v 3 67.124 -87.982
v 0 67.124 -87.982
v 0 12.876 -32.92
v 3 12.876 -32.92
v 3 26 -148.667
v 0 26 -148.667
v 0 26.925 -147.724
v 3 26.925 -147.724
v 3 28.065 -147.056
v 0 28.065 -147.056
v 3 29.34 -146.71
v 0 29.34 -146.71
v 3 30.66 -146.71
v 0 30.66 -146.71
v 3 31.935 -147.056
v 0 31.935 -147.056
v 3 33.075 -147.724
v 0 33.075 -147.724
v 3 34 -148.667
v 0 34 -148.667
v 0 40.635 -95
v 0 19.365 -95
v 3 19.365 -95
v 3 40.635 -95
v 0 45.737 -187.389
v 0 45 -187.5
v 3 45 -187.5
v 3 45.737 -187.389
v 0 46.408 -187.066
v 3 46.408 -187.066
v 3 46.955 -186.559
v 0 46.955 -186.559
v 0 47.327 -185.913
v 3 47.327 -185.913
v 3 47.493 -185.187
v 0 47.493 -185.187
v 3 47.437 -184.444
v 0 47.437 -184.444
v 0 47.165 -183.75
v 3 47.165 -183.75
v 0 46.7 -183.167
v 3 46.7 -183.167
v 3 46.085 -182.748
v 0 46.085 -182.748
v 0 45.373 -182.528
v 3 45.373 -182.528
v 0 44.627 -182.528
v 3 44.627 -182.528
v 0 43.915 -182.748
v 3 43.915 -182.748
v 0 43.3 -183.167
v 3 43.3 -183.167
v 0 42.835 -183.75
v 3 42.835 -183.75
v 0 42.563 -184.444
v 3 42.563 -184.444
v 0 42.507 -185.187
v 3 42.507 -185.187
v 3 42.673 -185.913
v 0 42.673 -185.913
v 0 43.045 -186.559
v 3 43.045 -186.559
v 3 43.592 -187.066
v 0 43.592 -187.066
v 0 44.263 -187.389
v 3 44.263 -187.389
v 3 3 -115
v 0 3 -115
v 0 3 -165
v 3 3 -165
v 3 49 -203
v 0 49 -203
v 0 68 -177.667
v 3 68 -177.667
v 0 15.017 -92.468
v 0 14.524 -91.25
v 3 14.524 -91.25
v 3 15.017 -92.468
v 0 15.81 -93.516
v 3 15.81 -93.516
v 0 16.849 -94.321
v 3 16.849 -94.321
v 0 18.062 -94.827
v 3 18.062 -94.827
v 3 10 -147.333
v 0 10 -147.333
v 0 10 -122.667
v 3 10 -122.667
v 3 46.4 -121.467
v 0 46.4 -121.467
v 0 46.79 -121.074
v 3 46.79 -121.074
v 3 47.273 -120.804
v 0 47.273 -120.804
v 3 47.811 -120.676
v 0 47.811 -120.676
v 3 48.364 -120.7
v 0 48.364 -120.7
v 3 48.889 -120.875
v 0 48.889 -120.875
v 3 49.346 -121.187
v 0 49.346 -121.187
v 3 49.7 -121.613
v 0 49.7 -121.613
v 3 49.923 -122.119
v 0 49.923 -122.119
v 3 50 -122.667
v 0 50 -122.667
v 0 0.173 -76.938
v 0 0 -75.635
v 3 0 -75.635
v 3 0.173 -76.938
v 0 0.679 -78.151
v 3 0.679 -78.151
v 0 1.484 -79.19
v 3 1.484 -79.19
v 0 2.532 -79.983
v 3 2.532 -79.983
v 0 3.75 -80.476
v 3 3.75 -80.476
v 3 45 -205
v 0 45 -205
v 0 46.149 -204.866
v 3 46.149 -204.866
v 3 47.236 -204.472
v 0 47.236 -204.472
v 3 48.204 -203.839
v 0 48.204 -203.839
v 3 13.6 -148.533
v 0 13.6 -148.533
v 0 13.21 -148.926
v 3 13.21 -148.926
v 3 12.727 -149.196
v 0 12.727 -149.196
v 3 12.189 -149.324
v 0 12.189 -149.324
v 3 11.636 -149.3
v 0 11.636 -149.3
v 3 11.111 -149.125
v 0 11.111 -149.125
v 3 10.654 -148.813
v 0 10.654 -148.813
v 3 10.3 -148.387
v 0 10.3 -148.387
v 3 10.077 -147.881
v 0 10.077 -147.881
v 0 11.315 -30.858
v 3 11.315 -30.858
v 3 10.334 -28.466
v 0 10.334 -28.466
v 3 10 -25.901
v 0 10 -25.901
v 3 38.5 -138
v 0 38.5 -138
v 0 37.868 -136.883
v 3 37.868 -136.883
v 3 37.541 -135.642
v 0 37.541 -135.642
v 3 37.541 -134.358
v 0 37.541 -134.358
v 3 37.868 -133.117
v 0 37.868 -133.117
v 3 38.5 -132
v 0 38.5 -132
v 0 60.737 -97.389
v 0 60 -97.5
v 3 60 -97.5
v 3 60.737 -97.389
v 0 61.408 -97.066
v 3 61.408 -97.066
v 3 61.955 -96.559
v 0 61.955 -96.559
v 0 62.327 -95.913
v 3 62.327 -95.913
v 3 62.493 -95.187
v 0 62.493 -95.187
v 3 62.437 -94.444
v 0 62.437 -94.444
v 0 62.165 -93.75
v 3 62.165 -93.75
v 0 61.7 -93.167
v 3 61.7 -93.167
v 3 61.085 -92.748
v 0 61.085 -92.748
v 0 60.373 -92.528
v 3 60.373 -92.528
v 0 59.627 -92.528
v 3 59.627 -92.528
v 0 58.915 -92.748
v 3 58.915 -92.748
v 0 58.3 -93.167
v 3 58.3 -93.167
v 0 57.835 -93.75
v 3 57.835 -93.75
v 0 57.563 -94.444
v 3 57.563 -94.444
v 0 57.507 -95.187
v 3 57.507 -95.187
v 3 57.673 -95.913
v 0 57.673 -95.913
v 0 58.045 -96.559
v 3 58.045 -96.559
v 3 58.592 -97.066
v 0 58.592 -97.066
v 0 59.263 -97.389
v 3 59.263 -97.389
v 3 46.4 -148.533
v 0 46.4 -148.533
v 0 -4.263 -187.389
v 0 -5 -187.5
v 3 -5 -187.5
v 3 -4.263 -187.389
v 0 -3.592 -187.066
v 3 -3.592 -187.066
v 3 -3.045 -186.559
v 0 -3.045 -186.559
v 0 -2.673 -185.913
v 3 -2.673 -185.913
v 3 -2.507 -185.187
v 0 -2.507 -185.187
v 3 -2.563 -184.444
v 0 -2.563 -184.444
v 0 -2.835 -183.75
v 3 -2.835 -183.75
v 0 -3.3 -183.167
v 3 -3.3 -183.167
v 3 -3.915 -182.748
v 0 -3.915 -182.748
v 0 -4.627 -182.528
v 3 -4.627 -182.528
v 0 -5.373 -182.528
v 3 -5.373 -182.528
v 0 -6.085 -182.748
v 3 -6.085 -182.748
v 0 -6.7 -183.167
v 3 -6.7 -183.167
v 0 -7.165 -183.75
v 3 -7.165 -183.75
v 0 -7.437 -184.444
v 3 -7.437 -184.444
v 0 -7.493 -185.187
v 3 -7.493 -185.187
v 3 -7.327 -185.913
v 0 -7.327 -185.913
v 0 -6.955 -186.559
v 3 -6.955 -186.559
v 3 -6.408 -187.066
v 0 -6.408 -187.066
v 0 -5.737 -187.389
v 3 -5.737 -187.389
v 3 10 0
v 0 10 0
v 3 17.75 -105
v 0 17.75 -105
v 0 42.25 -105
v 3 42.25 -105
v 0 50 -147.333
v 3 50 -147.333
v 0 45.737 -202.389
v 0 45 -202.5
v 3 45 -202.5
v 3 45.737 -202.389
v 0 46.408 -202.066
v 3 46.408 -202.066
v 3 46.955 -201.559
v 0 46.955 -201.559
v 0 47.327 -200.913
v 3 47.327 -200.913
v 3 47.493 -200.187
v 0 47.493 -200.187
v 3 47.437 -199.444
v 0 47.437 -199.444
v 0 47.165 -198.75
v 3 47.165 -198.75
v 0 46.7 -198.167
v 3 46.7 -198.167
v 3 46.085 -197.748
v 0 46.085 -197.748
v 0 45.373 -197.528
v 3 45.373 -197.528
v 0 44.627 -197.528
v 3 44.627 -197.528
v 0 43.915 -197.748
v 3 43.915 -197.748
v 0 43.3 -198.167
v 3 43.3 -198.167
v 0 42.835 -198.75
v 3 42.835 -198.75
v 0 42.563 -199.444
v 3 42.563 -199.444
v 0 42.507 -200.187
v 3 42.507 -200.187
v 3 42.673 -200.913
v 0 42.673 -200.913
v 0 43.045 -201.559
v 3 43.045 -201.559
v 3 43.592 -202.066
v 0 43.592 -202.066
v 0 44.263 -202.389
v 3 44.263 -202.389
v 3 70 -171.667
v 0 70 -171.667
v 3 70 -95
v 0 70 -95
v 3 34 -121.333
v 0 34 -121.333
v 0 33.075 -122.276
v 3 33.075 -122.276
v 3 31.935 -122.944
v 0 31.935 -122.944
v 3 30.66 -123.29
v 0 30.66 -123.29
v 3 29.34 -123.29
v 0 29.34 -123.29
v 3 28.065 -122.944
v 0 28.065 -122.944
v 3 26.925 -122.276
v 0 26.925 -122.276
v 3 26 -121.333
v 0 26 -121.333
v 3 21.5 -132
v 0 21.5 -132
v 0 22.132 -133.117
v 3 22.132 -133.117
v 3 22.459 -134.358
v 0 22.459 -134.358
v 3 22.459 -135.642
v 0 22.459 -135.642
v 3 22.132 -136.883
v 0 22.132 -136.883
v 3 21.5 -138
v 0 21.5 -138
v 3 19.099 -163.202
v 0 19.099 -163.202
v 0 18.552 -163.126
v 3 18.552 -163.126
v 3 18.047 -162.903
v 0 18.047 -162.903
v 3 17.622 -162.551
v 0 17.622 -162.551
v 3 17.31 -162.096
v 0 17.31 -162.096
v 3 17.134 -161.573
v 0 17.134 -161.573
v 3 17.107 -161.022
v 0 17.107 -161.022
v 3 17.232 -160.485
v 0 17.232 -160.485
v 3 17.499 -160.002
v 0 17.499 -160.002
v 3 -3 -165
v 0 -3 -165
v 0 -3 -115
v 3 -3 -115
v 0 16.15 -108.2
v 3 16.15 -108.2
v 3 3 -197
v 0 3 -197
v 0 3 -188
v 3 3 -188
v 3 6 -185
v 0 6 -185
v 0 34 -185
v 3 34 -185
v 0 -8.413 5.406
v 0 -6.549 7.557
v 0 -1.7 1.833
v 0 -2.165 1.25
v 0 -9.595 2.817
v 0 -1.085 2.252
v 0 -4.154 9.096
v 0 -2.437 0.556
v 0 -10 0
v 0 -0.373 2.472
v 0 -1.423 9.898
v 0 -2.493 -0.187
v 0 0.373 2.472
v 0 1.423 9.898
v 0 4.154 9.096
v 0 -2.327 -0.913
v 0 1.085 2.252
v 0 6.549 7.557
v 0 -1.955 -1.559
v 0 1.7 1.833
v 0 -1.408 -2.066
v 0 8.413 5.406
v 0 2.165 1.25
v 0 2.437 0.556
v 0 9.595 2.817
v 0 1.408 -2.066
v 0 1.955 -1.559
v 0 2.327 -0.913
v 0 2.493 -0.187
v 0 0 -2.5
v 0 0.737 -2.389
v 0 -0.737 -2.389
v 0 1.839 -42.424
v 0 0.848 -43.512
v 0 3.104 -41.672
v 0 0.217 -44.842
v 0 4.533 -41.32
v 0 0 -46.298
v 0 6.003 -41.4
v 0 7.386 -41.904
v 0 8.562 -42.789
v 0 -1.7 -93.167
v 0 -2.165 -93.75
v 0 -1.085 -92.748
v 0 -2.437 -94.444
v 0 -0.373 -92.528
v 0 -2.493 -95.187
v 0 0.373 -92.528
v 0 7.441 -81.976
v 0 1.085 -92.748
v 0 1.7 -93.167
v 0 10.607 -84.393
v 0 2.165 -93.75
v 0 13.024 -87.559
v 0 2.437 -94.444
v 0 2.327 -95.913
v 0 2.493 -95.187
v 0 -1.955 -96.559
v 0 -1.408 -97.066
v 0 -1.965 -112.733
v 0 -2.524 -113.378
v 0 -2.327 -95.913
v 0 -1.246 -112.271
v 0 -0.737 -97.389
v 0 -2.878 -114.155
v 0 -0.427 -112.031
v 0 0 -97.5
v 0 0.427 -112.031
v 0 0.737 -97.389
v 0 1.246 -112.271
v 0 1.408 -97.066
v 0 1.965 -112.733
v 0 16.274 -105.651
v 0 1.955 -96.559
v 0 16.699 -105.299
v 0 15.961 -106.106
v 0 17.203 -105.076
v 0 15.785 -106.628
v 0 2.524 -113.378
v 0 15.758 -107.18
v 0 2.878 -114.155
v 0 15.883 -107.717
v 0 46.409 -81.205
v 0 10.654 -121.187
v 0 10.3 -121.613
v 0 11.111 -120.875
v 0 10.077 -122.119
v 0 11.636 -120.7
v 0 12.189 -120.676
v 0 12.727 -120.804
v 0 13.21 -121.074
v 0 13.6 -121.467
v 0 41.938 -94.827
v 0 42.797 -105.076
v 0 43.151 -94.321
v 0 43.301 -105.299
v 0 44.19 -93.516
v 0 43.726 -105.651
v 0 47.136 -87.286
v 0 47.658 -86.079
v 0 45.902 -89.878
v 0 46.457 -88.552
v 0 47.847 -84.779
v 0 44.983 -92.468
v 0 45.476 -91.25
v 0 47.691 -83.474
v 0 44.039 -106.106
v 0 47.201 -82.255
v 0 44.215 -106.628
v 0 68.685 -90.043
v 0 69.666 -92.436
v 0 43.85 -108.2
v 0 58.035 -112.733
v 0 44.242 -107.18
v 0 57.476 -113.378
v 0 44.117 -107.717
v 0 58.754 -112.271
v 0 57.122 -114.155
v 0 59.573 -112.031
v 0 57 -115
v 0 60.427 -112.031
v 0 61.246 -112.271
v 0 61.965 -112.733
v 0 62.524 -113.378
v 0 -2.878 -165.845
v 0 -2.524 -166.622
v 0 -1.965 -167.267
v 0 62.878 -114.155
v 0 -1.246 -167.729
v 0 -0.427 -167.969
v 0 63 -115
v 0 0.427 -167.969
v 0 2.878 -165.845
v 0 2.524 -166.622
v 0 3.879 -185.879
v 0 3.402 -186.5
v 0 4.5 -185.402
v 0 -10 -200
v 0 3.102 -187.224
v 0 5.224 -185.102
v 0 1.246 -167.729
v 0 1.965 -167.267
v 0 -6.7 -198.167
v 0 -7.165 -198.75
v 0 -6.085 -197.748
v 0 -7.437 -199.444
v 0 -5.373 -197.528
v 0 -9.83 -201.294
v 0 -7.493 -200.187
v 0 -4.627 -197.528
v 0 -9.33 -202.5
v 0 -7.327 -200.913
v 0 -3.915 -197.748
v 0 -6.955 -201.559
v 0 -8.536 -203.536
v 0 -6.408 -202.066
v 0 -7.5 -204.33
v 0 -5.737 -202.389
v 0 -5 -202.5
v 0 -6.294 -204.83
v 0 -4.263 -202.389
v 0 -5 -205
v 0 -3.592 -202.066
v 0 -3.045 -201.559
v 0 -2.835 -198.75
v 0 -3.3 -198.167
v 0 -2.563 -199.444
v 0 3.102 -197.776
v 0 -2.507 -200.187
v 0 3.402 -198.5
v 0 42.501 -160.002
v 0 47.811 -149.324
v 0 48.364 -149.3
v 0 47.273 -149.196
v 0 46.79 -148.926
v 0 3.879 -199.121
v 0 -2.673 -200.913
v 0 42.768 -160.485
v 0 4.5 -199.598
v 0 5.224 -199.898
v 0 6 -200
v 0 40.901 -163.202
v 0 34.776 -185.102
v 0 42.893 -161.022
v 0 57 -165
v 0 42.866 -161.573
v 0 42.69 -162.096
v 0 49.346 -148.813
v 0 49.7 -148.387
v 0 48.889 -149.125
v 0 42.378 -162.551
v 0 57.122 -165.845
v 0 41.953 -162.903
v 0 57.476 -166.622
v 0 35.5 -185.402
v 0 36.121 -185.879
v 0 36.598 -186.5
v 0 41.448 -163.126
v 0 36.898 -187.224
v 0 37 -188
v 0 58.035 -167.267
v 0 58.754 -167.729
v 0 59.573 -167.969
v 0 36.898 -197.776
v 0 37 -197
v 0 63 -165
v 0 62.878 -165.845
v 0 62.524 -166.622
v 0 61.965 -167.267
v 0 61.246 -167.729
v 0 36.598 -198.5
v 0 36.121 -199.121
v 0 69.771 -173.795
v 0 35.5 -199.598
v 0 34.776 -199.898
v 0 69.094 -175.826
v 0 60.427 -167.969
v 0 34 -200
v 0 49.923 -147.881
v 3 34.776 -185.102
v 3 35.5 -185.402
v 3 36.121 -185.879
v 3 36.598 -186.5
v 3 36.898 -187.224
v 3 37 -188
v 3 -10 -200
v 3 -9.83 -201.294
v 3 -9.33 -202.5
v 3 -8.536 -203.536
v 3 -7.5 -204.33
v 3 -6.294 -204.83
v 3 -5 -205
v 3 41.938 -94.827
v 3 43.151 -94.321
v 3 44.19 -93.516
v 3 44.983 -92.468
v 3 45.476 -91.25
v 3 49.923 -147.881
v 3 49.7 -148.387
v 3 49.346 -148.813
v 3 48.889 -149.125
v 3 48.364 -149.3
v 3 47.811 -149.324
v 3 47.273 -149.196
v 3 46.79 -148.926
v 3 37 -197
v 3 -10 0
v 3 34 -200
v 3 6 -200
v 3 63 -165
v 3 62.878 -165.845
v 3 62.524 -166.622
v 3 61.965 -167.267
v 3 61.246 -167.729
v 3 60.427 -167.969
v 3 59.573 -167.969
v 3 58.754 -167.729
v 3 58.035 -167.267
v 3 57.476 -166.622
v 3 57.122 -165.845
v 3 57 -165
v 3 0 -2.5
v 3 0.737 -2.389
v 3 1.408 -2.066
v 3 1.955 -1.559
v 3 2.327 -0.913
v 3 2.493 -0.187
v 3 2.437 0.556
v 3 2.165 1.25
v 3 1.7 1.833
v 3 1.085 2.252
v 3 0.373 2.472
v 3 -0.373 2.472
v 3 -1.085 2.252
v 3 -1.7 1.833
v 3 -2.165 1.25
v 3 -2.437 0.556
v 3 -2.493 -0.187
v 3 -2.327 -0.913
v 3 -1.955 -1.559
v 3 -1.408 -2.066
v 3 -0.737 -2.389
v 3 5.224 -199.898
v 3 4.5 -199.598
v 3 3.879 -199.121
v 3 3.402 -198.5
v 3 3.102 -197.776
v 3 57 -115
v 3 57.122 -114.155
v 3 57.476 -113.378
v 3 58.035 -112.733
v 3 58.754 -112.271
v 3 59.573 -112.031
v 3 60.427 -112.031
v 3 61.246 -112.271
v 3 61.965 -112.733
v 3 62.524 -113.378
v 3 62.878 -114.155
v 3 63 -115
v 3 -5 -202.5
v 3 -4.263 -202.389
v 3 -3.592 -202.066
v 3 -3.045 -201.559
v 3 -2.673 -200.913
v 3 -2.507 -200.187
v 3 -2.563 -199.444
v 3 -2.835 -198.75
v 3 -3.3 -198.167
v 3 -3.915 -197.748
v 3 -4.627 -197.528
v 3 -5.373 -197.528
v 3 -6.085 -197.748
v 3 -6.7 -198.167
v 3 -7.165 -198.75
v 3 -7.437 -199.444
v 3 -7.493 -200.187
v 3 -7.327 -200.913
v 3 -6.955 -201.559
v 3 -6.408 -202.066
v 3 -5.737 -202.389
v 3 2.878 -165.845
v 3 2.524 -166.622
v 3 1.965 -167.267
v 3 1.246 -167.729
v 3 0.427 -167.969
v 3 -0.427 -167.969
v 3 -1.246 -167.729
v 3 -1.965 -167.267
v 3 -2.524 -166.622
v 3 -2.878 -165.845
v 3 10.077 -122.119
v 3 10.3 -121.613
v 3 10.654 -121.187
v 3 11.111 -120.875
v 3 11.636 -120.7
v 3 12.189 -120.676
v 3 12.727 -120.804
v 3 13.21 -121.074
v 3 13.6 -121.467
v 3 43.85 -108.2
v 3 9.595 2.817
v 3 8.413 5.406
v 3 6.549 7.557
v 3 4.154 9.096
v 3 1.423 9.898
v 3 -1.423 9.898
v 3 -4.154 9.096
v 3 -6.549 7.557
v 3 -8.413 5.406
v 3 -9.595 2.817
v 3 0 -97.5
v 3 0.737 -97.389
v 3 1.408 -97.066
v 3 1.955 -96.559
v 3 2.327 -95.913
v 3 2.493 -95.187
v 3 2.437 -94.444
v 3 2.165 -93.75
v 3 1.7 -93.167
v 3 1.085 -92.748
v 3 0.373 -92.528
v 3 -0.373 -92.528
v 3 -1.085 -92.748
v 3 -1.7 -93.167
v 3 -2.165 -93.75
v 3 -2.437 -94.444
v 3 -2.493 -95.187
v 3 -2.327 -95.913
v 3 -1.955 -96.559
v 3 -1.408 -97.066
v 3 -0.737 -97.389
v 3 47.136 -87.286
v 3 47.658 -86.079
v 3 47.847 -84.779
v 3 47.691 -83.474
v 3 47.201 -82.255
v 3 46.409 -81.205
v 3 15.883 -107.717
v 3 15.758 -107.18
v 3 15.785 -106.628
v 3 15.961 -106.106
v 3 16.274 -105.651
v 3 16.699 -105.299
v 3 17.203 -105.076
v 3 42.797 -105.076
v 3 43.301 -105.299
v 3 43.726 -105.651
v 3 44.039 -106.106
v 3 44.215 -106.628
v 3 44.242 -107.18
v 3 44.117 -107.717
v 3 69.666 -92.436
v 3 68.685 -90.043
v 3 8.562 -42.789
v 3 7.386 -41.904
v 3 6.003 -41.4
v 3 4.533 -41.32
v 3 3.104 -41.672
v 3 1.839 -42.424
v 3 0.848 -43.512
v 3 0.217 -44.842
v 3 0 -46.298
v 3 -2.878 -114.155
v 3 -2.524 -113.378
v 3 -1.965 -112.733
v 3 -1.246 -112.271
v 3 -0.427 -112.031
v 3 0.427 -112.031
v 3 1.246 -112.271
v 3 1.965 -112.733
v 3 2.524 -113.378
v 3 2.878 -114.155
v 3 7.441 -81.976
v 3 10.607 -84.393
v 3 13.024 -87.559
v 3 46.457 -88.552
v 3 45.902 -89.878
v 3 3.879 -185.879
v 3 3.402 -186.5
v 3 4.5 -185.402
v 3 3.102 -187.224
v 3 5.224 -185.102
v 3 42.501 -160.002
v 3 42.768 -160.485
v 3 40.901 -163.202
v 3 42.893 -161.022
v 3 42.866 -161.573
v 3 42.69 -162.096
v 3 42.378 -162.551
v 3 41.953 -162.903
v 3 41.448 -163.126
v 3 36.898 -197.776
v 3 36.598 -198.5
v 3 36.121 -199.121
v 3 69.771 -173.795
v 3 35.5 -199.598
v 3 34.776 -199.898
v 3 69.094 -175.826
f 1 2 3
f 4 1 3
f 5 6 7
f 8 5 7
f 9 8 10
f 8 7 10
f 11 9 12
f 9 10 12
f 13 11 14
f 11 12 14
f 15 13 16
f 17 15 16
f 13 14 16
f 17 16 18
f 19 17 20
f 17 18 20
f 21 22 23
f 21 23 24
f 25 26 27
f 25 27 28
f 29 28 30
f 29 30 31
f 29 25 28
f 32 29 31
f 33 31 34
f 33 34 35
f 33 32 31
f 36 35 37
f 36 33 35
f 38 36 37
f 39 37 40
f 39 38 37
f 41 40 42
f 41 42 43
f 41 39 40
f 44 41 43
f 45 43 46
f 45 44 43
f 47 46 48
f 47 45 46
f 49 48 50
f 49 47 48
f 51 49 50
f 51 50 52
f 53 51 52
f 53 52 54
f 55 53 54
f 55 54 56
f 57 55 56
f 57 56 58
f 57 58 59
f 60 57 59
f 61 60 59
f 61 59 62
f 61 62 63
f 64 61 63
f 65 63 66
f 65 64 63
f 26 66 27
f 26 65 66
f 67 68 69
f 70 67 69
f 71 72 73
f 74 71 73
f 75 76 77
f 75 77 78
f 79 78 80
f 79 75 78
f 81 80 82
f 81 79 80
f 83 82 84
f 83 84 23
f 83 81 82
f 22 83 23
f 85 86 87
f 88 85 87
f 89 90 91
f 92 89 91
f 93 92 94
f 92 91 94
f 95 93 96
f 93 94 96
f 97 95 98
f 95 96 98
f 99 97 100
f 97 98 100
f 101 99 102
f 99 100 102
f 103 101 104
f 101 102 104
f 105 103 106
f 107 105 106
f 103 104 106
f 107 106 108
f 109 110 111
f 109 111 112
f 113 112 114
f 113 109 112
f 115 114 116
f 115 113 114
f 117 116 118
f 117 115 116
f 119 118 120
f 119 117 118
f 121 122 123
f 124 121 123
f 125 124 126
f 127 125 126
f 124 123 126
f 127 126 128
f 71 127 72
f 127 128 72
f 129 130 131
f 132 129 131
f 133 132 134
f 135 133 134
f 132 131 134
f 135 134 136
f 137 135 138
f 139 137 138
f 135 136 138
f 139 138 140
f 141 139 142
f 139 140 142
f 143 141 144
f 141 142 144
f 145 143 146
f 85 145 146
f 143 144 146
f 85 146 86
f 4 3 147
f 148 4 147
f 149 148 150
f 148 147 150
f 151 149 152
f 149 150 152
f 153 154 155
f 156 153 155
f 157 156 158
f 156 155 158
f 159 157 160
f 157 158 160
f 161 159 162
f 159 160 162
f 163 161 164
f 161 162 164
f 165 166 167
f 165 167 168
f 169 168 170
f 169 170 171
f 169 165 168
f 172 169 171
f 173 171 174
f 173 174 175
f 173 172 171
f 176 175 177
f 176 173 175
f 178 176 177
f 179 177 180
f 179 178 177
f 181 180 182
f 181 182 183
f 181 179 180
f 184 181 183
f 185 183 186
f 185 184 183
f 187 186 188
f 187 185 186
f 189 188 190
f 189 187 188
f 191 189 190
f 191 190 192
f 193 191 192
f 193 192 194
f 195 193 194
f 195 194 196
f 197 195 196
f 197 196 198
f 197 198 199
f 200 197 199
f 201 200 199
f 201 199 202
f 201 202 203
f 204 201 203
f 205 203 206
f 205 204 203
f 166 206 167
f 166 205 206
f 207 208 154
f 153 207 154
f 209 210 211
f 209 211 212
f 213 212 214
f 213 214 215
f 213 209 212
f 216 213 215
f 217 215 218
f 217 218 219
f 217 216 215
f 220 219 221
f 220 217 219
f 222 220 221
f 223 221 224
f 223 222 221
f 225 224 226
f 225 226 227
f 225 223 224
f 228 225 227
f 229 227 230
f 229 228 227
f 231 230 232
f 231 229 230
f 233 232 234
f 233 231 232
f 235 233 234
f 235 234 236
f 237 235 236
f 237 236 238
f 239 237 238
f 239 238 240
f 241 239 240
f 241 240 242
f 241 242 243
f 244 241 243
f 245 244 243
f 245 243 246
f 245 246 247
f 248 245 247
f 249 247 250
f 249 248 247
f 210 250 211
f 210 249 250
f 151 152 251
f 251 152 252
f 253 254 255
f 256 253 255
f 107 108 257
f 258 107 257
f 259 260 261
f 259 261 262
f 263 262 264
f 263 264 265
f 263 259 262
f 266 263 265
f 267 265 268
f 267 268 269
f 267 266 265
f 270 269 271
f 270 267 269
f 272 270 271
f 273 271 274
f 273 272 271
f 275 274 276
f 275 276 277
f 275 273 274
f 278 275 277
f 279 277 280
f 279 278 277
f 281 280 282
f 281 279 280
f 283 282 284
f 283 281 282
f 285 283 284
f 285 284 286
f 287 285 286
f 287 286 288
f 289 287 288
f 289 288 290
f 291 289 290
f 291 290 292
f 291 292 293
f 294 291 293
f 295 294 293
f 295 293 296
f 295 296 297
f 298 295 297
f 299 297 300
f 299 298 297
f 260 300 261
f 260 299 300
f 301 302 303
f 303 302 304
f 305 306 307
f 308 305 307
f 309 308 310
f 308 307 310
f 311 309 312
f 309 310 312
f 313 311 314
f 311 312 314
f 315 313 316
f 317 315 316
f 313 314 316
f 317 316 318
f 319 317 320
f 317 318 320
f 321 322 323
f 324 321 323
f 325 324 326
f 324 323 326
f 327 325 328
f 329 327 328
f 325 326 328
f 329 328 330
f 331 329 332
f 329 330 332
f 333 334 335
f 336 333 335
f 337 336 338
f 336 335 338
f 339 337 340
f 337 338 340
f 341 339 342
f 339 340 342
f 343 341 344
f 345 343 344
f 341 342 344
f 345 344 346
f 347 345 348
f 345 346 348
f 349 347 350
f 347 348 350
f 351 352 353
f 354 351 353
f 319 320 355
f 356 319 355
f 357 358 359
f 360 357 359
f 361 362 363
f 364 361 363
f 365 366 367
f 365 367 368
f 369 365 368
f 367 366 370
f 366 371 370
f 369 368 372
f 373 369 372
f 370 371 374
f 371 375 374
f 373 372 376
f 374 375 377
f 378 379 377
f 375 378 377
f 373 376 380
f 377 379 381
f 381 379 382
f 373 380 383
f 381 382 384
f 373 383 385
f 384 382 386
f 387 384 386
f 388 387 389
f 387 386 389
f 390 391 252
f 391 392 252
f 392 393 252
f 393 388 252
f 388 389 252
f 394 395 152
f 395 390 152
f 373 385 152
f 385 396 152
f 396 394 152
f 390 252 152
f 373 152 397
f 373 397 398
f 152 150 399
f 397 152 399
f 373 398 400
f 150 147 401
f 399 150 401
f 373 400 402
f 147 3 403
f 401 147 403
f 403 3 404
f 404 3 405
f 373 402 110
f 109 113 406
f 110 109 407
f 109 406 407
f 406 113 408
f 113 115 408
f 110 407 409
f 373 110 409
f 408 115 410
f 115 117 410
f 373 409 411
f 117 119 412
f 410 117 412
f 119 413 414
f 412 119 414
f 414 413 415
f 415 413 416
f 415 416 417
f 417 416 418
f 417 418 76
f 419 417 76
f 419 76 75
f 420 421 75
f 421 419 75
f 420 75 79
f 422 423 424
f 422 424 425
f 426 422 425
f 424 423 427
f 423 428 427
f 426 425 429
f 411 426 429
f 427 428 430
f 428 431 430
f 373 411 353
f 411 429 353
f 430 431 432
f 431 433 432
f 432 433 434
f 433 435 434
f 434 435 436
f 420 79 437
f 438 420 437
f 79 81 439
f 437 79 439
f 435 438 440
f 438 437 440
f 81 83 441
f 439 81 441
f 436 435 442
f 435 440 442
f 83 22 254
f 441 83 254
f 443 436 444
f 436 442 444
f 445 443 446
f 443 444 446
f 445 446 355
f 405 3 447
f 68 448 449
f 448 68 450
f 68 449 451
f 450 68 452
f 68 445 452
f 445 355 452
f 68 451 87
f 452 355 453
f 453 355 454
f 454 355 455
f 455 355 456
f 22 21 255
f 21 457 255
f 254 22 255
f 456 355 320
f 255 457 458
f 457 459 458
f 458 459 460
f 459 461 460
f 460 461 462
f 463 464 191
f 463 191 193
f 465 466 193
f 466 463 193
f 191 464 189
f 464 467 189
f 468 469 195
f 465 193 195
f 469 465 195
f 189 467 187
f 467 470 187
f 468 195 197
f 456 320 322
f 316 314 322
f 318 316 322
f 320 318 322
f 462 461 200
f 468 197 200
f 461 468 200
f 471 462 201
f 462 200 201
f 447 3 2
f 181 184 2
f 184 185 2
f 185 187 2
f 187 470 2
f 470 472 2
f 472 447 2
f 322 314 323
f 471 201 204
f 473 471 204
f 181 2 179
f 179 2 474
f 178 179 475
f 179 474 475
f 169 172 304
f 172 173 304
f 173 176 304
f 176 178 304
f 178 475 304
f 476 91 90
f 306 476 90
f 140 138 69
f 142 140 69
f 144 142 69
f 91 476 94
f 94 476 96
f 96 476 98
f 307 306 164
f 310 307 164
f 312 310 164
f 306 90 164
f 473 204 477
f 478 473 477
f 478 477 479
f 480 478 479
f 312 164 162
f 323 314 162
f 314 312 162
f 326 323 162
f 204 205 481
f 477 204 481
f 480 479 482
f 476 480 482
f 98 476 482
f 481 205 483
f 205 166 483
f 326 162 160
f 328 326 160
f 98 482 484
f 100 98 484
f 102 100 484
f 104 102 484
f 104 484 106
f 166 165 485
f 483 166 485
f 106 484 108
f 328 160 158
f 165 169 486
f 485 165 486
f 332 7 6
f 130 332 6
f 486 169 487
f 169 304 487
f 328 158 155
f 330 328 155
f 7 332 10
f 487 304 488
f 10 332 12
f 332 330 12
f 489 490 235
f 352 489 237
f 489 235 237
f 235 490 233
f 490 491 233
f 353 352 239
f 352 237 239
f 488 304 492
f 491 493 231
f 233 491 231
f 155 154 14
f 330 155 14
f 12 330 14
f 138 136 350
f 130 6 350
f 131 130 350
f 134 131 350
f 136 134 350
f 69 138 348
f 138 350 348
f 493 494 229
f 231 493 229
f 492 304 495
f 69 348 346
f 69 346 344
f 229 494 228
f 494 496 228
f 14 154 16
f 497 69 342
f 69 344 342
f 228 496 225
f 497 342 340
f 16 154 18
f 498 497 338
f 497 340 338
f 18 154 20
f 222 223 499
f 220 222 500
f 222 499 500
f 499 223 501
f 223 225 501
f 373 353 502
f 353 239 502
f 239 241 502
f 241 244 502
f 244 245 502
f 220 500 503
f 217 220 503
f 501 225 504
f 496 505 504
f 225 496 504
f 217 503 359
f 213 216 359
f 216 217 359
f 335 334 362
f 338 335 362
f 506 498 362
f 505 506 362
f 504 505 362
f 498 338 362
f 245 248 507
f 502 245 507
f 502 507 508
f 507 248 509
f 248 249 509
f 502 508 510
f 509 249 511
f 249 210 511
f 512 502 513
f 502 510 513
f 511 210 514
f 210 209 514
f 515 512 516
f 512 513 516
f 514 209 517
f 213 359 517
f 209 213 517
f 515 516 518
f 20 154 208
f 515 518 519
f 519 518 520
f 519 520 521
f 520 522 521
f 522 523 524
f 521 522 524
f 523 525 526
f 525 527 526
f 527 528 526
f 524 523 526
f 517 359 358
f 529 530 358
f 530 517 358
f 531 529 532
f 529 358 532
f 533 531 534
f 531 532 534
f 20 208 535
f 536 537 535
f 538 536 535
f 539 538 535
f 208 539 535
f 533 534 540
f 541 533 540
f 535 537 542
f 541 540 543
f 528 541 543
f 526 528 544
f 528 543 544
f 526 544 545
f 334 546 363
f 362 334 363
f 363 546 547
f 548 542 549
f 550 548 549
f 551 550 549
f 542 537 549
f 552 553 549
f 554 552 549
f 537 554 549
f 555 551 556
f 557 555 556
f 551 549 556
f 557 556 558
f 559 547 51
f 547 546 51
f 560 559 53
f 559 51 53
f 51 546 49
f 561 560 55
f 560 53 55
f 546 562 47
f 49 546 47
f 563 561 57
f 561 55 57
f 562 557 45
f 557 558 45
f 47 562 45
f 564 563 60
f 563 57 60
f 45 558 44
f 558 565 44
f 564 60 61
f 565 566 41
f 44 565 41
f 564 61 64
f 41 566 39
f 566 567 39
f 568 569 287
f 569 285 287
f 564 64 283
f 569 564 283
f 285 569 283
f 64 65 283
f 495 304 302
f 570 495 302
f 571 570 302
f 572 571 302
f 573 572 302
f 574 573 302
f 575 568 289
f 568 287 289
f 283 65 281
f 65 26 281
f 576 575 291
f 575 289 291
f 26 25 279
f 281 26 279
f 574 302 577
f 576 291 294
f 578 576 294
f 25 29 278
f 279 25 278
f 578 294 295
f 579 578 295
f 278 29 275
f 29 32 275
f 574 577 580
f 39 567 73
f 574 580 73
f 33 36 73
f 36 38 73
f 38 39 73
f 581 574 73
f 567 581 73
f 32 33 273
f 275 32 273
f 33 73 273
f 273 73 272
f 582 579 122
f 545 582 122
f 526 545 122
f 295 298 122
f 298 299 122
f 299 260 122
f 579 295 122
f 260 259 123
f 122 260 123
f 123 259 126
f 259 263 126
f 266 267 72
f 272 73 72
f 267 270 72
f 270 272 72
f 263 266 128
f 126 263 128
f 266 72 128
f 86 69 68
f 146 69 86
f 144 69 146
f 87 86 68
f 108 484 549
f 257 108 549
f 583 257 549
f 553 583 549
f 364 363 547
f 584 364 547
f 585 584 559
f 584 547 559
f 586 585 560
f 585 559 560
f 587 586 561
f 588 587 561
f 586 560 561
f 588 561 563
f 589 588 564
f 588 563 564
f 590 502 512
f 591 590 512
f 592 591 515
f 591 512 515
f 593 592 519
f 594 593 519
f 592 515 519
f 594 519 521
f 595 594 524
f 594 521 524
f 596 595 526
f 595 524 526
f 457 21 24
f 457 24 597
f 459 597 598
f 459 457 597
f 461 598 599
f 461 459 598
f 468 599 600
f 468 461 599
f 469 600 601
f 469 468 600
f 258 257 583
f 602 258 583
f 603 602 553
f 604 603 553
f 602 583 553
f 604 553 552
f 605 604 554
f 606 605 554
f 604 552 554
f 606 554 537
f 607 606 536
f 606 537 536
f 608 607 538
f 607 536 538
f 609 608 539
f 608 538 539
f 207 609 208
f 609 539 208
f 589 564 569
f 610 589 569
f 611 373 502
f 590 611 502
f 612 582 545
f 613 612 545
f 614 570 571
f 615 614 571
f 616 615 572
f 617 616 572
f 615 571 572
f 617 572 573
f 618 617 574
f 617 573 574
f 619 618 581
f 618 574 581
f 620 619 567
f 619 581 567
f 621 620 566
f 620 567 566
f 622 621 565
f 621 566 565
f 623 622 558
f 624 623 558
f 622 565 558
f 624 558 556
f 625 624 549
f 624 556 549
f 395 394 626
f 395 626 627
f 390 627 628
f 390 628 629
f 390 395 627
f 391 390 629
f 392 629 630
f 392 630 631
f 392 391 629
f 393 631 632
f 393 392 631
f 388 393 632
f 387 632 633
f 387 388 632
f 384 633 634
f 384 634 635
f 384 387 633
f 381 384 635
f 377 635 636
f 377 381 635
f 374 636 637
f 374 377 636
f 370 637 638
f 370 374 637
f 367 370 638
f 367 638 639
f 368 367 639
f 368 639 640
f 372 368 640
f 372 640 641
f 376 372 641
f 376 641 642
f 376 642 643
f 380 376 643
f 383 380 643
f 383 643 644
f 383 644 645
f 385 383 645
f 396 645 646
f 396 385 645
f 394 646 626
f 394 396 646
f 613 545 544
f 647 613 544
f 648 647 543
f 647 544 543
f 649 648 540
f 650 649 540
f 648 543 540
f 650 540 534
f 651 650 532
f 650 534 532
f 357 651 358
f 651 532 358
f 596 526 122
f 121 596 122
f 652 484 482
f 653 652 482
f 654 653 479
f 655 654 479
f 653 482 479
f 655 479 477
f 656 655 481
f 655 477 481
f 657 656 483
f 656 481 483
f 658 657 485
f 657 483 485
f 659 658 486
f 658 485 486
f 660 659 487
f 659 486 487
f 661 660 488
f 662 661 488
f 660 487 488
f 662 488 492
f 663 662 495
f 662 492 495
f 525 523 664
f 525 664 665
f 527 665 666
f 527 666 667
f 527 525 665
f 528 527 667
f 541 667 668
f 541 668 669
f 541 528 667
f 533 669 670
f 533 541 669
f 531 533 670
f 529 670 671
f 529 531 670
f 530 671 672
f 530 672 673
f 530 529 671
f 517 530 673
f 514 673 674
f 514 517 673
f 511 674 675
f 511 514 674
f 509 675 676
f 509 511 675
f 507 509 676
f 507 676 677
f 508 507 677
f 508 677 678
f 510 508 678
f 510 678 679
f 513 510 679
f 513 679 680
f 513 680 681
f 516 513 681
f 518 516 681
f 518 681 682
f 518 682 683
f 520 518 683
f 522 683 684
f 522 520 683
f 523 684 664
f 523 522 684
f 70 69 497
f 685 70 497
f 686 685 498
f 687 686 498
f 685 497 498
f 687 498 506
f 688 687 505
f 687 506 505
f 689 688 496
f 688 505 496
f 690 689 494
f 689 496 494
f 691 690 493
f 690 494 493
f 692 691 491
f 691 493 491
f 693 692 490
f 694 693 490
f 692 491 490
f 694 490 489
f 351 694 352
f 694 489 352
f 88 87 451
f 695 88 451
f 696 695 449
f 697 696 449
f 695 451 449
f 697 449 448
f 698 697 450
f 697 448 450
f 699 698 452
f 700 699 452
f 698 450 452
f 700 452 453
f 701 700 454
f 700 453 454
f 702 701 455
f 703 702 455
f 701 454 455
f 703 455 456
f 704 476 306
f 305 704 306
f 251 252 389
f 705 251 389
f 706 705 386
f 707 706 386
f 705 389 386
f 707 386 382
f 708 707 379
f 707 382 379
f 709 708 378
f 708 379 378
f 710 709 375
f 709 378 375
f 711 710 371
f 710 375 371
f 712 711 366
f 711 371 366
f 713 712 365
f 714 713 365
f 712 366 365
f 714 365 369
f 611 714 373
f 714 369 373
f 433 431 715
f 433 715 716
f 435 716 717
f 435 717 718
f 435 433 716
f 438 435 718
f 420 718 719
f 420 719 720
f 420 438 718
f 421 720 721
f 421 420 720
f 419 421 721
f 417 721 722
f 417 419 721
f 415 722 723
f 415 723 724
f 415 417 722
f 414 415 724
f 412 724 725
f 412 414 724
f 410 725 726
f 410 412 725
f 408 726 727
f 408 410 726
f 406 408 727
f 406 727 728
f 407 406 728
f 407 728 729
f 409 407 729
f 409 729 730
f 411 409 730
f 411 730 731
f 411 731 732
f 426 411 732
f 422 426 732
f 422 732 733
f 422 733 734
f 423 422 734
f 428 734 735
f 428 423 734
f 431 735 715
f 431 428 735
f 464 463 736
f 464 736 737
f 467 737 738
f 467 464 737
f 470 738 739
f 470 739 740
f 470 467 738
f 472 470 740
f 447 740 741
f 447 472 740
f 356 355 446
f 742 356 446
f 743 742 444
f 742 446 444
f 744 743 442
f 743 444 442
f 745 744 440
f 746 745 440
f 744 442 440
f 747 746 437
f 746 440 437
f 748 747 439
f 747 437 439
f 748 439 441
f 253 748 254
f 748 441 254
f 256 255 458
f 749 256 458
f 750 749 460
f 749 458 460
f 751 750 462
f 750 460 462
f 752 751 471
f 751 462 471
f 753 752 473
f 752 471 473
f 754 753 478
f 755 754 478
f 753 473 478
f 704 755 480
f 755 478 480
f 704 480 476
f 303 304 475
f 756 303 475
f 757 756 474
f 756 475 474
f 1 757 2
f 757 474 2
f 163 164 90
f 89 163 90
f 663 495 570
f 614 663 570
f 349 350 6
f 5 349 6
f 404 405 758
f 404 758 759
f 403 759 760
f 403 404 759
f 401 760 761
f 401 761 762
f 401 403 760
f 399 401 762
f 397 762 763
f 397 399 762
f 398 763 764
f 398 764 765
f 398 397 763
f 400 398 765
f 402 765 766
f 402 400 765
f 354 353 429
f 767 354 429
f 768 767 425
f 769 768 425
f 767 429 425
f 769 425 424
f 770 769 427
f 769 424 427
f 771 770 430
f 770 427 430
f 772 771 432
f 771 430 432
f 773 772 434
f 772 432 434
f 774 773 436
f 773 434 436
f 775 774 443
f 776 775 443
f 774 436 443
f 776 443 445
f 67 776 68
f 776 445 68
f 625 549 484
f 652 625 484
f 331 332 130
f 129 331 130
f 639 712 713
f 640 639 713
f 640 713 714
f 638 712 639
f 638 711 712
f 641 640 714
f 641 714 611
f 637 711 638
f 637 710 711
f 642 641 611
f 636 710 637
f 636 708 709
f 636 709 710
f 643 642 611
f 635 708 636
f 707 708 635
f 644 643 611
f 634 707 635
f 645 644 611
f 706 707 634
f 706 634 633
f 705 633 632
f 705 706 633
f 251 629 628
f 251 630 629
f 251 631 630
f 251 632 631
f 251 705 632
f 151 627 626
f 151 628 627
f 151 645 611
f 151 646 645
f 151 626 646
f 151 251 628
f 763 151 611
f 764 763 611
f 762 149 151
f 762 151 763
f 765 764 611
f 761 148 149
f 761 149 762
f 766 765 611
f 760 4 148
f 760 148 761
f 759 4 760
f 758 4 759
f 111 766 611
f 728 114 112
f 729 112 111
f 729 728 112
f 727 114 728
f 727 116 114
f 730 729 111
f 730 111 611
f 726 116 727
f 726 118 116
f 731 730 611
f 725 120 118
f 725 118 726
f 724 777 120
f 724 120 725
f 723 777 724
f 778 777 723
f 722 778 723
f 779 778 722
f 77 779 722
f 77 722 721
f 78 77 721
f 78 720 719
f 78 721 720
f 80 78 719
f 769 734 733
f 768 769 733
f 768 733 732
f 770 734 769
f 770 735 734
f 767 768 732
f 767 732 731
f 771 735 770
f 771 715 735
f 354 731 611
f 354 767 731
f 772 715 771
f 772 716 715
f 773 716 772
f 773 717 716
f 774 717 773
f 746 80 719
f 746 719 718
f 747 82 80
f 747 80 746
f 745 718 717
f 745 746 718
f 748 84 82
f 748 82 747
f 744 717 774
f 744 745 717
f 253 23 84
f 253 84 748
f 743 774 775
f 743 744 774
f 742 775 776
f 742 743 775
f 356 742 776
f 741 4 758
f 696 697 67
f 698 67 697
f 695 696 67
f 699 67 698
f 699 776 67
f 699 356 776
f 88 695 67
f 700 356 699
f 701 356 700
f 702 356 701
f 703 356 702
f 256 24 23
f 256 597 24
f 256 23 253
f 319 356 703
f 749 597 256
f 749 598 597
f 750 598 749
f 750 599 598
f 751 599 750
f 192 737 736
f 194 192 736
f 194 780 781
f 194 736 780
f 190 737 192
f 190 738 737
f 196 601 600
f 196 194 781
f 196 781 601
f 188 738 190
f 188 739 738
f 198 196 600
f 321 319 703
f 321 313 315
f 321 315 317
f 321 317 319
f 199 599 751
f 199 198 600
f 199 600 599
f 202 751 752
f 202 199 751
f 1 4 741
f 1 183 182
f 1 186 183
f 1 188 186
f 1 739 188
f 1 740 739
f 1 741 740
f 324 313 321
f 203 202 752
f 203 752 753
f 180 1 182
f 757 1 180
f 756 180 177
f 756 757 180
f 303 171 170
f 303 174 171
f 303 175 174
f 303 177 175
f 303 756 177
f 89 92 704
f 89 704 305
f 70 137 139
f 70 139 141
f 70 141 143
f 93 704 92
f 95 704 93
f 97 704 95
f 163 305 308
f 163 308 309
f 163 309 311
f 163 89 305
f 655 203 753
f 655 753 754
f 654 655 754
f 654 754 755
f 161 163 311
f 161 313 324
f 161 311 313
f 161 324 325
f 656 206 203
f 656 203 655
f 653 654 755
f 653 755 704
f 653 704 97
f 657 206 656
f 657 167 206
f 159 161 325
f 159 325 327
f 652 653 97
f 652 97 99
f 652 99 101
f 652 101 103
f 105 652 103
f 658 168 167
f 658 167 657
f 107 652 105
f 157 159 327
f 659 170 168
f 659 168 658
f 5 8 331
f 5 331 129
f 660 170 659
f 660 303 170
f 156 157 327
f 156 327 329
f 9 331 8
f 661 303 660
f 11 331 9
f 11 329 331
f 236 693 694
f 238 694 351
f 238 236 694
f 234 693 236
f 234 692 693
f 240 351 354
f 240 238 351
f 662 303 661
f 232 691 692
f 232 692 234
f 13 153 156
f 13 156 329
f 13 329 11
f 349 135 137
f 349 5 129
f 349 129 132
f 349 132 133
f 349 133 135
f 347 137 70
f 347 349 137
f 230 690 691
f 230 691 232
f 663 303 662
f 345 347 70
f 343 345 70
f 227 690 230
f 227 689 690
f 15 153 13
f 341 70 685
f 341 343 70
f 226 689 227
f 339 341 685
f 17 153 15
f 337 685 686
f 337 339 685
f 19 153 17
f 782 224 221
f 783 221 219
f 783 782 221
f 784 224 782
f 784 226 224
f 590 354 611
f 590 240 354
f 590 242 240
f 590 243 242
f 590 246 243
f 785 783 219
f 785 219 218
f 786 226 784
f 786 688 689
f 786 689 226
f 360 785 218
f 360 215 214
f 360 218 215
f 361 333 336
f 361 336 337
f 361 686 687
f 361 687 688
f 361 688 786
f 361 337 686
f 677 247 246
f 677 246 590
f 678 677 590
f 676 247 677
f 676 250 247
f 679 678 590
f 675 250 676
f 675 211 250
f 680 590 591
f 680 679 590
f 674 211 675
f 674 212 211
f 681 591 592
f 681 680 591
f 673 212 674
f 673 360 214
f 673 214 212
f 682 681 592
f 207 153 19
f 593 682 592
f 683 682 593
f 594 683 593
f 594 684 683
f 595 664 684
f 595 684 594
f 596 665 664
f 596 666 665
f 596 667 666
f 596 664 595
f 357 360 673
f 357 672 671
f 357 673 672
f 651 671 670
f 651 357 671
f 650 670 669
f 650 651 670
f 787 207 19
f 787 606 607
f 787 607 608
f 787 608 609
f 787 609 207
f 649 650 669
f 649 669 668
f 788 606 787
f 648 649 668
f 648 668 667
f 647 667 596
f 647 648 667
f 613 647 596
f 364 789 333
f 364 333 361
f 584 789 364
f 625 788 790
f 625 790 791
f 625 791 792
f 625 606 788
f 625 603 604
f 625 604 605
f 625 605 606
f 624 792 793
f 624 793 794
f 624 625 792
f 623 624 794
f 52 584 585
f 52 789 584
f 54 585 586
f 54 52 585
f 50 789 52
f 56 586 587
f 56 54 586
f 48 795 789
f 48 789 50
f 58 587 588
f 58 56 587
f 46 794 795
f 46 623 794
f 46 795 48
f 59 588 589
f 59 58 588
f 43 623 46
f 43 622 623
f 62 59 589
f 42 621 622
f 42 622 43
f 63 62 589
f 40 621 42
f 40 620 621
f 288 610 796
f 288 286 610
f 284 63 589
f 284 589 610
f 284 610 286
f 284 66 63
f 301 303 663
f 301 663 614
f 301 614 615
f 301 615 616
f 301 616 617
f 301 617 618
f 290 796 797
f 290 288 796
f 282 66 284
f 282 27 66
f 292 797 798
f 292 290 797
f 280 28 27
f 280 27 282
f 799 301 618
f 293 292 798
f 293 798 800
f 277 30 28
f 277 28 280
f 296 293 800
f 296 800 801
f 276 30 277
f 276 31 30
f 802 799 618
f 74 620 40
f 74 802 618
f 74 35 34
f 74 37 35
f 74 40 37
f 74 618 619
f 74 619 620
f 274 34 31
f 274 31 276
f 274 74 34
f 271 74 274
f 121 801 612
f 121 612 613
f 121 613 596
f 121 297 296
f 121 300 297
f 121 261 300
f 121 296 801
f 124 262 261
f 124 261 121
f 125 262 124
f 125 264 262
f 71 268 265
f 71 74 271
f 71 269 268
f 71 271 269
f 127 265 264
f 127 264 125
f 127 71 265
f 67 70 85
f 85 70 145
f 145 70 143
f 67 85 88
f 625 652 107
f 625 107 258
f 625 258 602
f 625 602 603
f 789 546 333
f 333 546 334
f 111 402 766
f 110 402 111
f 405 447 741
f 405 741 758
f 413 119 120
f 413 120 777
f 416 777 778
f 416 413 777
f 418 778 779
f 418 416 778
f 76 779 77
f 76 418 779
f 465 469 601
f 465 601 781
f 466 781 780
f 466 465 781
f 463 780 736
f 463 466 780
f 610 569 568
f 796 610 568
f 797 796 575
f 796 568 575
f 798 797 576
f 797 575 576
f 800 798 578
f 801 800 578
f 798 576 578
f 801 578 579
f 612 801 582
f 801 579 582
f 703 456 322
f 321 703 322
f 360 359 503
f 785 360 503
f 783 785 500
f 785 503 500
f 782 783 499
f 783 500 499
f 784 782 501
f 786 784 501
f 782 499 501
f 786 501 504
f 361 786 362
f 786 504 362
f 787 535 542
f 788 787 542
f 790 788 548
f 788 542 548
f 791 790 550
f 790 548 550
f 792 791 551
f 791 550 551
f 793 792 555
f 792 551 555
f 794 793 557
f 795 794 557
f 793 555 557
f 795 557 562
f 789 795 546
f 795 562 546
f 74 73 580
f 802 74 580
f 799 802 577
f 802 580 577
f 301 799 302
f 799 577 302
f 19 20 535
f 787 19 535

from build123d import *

# Parameters (mm, degrees)
SKETCH_1_R      = 2.5
EXTRUDE_1_DEPTH = 3


with BuildPart() as part:
    # 草图1 → 凸台-拉伸1 (new body)
    with BuildSketch(Plane(origin=(0, 0, 0), x_dir=(0, 0, -1), z_dir=(1, 0, 0))):
        with BuildLine():
            Line((0, -10), (175, -10))
            Line((175, -10), (200, -10))
            ThreePointArc((200, -10), (203.535533906, -8.535533906), (205, -5))
            Line((205, -5), (205, 45))
            ThreePointArc((205, 45), (204.472135955, 47.236067977), (203, 49))
            Line((203, 49), (177.666666667, 68))
            ThreePointArc((177.666666667, 68), (174.828944327, 69.486832981), (171.666666667, 70))
            Line((171.666666667, 70), (95, 70))
            ThreePointArc((95, 70), (91.207635036, 69.252997784), (87.98185108, 67.123593597))
            Line((87.98185108, 67.123593597), (32.919623175, 12.876406403))
            ThreePointArc((32.919623175, 12.876406403), (29.693839218, 10.747002216), (25.901474255, 10))
            Line((25.901474255, 10), (0, 10))
            ThreePointArc((0, 10), (-10, 0), (0, -10))
        make_face()
        Circle(SKETCH_1_R, mode=Mode.SUBTRACT)
        with Locations((95, 0)):
            Circle(SKETCH_1_R, mode=Mode.SUBTRACT)
        with Locations((95, 60)):
            Circle(SKETCH_1_R, mode=Mode.SUBTRACT)
        with Locations((200, 45)):
            Circle(SKETCH_1_R, mode=Mode.SUBTRACT)
        with Locations((200, -5)):
            Circle(SKETCH_1_R, mode=Mode.SUBTRACT)
        with Locations((185, 45)):
            Circle(SKETCH_1_R, mode=Mode.SUBTRACT)
        with Locations((185, -5)):
            Circle(SKETCH_1_R, mode=Mode.SUBTRACT)
        with BuildLine():
            Line((46.298034327, 0), (75.635083269, 0))
            ThreePointArc((75.635083269, 0), (78.696945447, 1.047152925), (80.476312452, 3.75))
            ThreePointArc((80.476312452, 3.75), (84.393398282, 10.606601718), (91.25, 14.523687548))
            ThreePointArc((91.25, 14.523687548), (93.952847075, 16.303054553), (95, 19.364916731))
            Line((95, 19.364916731), (95, 40.635083269))
            ThreePointArc((95, 40.635083269), (93.952847075, 43.696945447), (91.25, 45.476312452))
            ThreePointArc((91.25, 45.476312452), (89.208124255, 46.163303308), (87.285721083, 47.135712192))
            ThreePointArc((87.285721083, 47.135712192), (84.121274015, 47.812324342), (81.205220318, 46.409413055))
            Line((81.205220318, 46.409413055), (42.788959867, 8.561796798))
            ThreePointArc((42.788959867, 8.561796798), (41.671535435, 3.103817518), (46.298034327, 0))
        make_face(mode=Mode.SUBTRACT)
        with BuildLine():
            Line((108.2, 43.85), (121.333333333, 34))
            ThreePointArc((121.333333333, 34), (123.333333333, 30), (121.333333333, 26))
            Line((121.333333333, 26), (108.2, 16.15))
            ThreePointArc((108.2, 16.15), (106.105572809, 15.961145618), (105, 17.75))
            Line((105, 17.75), (105, 42.25))
            ThreePointArc((105, 42.25), (106.105572809, 44.038854382), (108.2, 43.85))
        make_face(mode=Mode.SUBTRACT)
        with BuildLine():
            Line((122.666666667, 50), (147.333333333, 50))
            ThreePointArc((147.333333333, 50), (149.230699929, 48.632455532), (148.533333333, 46.4))
            Line((148.533333333, 46.4), (138, 38.5))
            ThreePointArc((138, 38.5), (135, 37.5), (132, 38.5))
            Line((132, 38.5), (121.466666667, 46.4))
            ThreePointArc((121.466666667, 46.4), (120.769300071, 48.632455532), (122.666666667, 50))
        make_face(mode=Mode.SUBTRACT)
        with BuildLine():
            Line((163.201700099, 40.901275074), (163.201700099, 19.098724926))
            ThreePointArc((163.201700099, 19.098724926), (162.09612729, 17.309870544), (160.001700099, 17.498724926))
            Line((160.001700099, 17.498724926), (148.666666667, 26))
            ThreePointArc((148.666666667, 26), (146.666666667, 30), (148.666666667, 34))
            Line((148.666666667, 34), (160.001700099, 42.501275074))
            ThreePointArc((160.001700099, 42.501275074), (162.09612729, 42.690129456), (163.201700099, 40.901275074))
        make_face(mode=Mode.SUBTRACT)
        with BuildLine():
            Line((121.466666667, 13.6), (132, 21.5))
            ThreePointArc((132, 21.5), (135, 22.5), (138, 21.5))
            Line((138, 21.5), (148.533333333, 13.6))
            ThreePointArc((148.533333333, 13.6), (149.230699929, 11.367544468), (147.333333333, 10))
            Line((147.333333333, 10), (122.666666667, 10))
            ThreePointArc((122.666666667, 10), (120.769300071, 11.367544468), (121.466666667, 13.6))
        make_face(mode=Mode.SUBTRACT)
        with BuildLine():
            Line((115, 63), (165, 63))
            ThreePointArc((165, 63), (168, 60), (165, 57))
            Line((165, 57), (115, 57))
            ThreePointArc((115, 57), (112, 60), (115, 63))
        make_face(mode=Mode.SUBTRACT)
        with BuildLine():
            Line((115, 3), (165, 3))
            ThreePointArc((165, 3), (168, 0), (165, -3))
            Line((165, -3), (115, -3))
            ThreePointArc((115, -3), (112, 0), (115, 3))
        make_face(mode=Mode.SUBTRACT)
        with BuildLine():
            Line((188, 37), (197, 37))
            ThreePointArc((197, 37), (199.121320344, 36.121320344), (200, 34))
            Line((200, 34), (200, 6))
            ThreePointArc((200, 6), (199.121320344, 3.878679656), (197, 3))
            Line((197, 3), (188, 3))
            ThreePointArc((188, 3), (185.878679656, 3.878679656), (185, 6))
            Line((185, 6), (185, 34))
            ThreePointArc((185, 34), (185.878679656, 36.121320344), (188, 37))
        make_face(mode=Mode.SUBTRACT)
    extrude(amount=EXTRUDE_1_DEPTH)


solid = part.part
